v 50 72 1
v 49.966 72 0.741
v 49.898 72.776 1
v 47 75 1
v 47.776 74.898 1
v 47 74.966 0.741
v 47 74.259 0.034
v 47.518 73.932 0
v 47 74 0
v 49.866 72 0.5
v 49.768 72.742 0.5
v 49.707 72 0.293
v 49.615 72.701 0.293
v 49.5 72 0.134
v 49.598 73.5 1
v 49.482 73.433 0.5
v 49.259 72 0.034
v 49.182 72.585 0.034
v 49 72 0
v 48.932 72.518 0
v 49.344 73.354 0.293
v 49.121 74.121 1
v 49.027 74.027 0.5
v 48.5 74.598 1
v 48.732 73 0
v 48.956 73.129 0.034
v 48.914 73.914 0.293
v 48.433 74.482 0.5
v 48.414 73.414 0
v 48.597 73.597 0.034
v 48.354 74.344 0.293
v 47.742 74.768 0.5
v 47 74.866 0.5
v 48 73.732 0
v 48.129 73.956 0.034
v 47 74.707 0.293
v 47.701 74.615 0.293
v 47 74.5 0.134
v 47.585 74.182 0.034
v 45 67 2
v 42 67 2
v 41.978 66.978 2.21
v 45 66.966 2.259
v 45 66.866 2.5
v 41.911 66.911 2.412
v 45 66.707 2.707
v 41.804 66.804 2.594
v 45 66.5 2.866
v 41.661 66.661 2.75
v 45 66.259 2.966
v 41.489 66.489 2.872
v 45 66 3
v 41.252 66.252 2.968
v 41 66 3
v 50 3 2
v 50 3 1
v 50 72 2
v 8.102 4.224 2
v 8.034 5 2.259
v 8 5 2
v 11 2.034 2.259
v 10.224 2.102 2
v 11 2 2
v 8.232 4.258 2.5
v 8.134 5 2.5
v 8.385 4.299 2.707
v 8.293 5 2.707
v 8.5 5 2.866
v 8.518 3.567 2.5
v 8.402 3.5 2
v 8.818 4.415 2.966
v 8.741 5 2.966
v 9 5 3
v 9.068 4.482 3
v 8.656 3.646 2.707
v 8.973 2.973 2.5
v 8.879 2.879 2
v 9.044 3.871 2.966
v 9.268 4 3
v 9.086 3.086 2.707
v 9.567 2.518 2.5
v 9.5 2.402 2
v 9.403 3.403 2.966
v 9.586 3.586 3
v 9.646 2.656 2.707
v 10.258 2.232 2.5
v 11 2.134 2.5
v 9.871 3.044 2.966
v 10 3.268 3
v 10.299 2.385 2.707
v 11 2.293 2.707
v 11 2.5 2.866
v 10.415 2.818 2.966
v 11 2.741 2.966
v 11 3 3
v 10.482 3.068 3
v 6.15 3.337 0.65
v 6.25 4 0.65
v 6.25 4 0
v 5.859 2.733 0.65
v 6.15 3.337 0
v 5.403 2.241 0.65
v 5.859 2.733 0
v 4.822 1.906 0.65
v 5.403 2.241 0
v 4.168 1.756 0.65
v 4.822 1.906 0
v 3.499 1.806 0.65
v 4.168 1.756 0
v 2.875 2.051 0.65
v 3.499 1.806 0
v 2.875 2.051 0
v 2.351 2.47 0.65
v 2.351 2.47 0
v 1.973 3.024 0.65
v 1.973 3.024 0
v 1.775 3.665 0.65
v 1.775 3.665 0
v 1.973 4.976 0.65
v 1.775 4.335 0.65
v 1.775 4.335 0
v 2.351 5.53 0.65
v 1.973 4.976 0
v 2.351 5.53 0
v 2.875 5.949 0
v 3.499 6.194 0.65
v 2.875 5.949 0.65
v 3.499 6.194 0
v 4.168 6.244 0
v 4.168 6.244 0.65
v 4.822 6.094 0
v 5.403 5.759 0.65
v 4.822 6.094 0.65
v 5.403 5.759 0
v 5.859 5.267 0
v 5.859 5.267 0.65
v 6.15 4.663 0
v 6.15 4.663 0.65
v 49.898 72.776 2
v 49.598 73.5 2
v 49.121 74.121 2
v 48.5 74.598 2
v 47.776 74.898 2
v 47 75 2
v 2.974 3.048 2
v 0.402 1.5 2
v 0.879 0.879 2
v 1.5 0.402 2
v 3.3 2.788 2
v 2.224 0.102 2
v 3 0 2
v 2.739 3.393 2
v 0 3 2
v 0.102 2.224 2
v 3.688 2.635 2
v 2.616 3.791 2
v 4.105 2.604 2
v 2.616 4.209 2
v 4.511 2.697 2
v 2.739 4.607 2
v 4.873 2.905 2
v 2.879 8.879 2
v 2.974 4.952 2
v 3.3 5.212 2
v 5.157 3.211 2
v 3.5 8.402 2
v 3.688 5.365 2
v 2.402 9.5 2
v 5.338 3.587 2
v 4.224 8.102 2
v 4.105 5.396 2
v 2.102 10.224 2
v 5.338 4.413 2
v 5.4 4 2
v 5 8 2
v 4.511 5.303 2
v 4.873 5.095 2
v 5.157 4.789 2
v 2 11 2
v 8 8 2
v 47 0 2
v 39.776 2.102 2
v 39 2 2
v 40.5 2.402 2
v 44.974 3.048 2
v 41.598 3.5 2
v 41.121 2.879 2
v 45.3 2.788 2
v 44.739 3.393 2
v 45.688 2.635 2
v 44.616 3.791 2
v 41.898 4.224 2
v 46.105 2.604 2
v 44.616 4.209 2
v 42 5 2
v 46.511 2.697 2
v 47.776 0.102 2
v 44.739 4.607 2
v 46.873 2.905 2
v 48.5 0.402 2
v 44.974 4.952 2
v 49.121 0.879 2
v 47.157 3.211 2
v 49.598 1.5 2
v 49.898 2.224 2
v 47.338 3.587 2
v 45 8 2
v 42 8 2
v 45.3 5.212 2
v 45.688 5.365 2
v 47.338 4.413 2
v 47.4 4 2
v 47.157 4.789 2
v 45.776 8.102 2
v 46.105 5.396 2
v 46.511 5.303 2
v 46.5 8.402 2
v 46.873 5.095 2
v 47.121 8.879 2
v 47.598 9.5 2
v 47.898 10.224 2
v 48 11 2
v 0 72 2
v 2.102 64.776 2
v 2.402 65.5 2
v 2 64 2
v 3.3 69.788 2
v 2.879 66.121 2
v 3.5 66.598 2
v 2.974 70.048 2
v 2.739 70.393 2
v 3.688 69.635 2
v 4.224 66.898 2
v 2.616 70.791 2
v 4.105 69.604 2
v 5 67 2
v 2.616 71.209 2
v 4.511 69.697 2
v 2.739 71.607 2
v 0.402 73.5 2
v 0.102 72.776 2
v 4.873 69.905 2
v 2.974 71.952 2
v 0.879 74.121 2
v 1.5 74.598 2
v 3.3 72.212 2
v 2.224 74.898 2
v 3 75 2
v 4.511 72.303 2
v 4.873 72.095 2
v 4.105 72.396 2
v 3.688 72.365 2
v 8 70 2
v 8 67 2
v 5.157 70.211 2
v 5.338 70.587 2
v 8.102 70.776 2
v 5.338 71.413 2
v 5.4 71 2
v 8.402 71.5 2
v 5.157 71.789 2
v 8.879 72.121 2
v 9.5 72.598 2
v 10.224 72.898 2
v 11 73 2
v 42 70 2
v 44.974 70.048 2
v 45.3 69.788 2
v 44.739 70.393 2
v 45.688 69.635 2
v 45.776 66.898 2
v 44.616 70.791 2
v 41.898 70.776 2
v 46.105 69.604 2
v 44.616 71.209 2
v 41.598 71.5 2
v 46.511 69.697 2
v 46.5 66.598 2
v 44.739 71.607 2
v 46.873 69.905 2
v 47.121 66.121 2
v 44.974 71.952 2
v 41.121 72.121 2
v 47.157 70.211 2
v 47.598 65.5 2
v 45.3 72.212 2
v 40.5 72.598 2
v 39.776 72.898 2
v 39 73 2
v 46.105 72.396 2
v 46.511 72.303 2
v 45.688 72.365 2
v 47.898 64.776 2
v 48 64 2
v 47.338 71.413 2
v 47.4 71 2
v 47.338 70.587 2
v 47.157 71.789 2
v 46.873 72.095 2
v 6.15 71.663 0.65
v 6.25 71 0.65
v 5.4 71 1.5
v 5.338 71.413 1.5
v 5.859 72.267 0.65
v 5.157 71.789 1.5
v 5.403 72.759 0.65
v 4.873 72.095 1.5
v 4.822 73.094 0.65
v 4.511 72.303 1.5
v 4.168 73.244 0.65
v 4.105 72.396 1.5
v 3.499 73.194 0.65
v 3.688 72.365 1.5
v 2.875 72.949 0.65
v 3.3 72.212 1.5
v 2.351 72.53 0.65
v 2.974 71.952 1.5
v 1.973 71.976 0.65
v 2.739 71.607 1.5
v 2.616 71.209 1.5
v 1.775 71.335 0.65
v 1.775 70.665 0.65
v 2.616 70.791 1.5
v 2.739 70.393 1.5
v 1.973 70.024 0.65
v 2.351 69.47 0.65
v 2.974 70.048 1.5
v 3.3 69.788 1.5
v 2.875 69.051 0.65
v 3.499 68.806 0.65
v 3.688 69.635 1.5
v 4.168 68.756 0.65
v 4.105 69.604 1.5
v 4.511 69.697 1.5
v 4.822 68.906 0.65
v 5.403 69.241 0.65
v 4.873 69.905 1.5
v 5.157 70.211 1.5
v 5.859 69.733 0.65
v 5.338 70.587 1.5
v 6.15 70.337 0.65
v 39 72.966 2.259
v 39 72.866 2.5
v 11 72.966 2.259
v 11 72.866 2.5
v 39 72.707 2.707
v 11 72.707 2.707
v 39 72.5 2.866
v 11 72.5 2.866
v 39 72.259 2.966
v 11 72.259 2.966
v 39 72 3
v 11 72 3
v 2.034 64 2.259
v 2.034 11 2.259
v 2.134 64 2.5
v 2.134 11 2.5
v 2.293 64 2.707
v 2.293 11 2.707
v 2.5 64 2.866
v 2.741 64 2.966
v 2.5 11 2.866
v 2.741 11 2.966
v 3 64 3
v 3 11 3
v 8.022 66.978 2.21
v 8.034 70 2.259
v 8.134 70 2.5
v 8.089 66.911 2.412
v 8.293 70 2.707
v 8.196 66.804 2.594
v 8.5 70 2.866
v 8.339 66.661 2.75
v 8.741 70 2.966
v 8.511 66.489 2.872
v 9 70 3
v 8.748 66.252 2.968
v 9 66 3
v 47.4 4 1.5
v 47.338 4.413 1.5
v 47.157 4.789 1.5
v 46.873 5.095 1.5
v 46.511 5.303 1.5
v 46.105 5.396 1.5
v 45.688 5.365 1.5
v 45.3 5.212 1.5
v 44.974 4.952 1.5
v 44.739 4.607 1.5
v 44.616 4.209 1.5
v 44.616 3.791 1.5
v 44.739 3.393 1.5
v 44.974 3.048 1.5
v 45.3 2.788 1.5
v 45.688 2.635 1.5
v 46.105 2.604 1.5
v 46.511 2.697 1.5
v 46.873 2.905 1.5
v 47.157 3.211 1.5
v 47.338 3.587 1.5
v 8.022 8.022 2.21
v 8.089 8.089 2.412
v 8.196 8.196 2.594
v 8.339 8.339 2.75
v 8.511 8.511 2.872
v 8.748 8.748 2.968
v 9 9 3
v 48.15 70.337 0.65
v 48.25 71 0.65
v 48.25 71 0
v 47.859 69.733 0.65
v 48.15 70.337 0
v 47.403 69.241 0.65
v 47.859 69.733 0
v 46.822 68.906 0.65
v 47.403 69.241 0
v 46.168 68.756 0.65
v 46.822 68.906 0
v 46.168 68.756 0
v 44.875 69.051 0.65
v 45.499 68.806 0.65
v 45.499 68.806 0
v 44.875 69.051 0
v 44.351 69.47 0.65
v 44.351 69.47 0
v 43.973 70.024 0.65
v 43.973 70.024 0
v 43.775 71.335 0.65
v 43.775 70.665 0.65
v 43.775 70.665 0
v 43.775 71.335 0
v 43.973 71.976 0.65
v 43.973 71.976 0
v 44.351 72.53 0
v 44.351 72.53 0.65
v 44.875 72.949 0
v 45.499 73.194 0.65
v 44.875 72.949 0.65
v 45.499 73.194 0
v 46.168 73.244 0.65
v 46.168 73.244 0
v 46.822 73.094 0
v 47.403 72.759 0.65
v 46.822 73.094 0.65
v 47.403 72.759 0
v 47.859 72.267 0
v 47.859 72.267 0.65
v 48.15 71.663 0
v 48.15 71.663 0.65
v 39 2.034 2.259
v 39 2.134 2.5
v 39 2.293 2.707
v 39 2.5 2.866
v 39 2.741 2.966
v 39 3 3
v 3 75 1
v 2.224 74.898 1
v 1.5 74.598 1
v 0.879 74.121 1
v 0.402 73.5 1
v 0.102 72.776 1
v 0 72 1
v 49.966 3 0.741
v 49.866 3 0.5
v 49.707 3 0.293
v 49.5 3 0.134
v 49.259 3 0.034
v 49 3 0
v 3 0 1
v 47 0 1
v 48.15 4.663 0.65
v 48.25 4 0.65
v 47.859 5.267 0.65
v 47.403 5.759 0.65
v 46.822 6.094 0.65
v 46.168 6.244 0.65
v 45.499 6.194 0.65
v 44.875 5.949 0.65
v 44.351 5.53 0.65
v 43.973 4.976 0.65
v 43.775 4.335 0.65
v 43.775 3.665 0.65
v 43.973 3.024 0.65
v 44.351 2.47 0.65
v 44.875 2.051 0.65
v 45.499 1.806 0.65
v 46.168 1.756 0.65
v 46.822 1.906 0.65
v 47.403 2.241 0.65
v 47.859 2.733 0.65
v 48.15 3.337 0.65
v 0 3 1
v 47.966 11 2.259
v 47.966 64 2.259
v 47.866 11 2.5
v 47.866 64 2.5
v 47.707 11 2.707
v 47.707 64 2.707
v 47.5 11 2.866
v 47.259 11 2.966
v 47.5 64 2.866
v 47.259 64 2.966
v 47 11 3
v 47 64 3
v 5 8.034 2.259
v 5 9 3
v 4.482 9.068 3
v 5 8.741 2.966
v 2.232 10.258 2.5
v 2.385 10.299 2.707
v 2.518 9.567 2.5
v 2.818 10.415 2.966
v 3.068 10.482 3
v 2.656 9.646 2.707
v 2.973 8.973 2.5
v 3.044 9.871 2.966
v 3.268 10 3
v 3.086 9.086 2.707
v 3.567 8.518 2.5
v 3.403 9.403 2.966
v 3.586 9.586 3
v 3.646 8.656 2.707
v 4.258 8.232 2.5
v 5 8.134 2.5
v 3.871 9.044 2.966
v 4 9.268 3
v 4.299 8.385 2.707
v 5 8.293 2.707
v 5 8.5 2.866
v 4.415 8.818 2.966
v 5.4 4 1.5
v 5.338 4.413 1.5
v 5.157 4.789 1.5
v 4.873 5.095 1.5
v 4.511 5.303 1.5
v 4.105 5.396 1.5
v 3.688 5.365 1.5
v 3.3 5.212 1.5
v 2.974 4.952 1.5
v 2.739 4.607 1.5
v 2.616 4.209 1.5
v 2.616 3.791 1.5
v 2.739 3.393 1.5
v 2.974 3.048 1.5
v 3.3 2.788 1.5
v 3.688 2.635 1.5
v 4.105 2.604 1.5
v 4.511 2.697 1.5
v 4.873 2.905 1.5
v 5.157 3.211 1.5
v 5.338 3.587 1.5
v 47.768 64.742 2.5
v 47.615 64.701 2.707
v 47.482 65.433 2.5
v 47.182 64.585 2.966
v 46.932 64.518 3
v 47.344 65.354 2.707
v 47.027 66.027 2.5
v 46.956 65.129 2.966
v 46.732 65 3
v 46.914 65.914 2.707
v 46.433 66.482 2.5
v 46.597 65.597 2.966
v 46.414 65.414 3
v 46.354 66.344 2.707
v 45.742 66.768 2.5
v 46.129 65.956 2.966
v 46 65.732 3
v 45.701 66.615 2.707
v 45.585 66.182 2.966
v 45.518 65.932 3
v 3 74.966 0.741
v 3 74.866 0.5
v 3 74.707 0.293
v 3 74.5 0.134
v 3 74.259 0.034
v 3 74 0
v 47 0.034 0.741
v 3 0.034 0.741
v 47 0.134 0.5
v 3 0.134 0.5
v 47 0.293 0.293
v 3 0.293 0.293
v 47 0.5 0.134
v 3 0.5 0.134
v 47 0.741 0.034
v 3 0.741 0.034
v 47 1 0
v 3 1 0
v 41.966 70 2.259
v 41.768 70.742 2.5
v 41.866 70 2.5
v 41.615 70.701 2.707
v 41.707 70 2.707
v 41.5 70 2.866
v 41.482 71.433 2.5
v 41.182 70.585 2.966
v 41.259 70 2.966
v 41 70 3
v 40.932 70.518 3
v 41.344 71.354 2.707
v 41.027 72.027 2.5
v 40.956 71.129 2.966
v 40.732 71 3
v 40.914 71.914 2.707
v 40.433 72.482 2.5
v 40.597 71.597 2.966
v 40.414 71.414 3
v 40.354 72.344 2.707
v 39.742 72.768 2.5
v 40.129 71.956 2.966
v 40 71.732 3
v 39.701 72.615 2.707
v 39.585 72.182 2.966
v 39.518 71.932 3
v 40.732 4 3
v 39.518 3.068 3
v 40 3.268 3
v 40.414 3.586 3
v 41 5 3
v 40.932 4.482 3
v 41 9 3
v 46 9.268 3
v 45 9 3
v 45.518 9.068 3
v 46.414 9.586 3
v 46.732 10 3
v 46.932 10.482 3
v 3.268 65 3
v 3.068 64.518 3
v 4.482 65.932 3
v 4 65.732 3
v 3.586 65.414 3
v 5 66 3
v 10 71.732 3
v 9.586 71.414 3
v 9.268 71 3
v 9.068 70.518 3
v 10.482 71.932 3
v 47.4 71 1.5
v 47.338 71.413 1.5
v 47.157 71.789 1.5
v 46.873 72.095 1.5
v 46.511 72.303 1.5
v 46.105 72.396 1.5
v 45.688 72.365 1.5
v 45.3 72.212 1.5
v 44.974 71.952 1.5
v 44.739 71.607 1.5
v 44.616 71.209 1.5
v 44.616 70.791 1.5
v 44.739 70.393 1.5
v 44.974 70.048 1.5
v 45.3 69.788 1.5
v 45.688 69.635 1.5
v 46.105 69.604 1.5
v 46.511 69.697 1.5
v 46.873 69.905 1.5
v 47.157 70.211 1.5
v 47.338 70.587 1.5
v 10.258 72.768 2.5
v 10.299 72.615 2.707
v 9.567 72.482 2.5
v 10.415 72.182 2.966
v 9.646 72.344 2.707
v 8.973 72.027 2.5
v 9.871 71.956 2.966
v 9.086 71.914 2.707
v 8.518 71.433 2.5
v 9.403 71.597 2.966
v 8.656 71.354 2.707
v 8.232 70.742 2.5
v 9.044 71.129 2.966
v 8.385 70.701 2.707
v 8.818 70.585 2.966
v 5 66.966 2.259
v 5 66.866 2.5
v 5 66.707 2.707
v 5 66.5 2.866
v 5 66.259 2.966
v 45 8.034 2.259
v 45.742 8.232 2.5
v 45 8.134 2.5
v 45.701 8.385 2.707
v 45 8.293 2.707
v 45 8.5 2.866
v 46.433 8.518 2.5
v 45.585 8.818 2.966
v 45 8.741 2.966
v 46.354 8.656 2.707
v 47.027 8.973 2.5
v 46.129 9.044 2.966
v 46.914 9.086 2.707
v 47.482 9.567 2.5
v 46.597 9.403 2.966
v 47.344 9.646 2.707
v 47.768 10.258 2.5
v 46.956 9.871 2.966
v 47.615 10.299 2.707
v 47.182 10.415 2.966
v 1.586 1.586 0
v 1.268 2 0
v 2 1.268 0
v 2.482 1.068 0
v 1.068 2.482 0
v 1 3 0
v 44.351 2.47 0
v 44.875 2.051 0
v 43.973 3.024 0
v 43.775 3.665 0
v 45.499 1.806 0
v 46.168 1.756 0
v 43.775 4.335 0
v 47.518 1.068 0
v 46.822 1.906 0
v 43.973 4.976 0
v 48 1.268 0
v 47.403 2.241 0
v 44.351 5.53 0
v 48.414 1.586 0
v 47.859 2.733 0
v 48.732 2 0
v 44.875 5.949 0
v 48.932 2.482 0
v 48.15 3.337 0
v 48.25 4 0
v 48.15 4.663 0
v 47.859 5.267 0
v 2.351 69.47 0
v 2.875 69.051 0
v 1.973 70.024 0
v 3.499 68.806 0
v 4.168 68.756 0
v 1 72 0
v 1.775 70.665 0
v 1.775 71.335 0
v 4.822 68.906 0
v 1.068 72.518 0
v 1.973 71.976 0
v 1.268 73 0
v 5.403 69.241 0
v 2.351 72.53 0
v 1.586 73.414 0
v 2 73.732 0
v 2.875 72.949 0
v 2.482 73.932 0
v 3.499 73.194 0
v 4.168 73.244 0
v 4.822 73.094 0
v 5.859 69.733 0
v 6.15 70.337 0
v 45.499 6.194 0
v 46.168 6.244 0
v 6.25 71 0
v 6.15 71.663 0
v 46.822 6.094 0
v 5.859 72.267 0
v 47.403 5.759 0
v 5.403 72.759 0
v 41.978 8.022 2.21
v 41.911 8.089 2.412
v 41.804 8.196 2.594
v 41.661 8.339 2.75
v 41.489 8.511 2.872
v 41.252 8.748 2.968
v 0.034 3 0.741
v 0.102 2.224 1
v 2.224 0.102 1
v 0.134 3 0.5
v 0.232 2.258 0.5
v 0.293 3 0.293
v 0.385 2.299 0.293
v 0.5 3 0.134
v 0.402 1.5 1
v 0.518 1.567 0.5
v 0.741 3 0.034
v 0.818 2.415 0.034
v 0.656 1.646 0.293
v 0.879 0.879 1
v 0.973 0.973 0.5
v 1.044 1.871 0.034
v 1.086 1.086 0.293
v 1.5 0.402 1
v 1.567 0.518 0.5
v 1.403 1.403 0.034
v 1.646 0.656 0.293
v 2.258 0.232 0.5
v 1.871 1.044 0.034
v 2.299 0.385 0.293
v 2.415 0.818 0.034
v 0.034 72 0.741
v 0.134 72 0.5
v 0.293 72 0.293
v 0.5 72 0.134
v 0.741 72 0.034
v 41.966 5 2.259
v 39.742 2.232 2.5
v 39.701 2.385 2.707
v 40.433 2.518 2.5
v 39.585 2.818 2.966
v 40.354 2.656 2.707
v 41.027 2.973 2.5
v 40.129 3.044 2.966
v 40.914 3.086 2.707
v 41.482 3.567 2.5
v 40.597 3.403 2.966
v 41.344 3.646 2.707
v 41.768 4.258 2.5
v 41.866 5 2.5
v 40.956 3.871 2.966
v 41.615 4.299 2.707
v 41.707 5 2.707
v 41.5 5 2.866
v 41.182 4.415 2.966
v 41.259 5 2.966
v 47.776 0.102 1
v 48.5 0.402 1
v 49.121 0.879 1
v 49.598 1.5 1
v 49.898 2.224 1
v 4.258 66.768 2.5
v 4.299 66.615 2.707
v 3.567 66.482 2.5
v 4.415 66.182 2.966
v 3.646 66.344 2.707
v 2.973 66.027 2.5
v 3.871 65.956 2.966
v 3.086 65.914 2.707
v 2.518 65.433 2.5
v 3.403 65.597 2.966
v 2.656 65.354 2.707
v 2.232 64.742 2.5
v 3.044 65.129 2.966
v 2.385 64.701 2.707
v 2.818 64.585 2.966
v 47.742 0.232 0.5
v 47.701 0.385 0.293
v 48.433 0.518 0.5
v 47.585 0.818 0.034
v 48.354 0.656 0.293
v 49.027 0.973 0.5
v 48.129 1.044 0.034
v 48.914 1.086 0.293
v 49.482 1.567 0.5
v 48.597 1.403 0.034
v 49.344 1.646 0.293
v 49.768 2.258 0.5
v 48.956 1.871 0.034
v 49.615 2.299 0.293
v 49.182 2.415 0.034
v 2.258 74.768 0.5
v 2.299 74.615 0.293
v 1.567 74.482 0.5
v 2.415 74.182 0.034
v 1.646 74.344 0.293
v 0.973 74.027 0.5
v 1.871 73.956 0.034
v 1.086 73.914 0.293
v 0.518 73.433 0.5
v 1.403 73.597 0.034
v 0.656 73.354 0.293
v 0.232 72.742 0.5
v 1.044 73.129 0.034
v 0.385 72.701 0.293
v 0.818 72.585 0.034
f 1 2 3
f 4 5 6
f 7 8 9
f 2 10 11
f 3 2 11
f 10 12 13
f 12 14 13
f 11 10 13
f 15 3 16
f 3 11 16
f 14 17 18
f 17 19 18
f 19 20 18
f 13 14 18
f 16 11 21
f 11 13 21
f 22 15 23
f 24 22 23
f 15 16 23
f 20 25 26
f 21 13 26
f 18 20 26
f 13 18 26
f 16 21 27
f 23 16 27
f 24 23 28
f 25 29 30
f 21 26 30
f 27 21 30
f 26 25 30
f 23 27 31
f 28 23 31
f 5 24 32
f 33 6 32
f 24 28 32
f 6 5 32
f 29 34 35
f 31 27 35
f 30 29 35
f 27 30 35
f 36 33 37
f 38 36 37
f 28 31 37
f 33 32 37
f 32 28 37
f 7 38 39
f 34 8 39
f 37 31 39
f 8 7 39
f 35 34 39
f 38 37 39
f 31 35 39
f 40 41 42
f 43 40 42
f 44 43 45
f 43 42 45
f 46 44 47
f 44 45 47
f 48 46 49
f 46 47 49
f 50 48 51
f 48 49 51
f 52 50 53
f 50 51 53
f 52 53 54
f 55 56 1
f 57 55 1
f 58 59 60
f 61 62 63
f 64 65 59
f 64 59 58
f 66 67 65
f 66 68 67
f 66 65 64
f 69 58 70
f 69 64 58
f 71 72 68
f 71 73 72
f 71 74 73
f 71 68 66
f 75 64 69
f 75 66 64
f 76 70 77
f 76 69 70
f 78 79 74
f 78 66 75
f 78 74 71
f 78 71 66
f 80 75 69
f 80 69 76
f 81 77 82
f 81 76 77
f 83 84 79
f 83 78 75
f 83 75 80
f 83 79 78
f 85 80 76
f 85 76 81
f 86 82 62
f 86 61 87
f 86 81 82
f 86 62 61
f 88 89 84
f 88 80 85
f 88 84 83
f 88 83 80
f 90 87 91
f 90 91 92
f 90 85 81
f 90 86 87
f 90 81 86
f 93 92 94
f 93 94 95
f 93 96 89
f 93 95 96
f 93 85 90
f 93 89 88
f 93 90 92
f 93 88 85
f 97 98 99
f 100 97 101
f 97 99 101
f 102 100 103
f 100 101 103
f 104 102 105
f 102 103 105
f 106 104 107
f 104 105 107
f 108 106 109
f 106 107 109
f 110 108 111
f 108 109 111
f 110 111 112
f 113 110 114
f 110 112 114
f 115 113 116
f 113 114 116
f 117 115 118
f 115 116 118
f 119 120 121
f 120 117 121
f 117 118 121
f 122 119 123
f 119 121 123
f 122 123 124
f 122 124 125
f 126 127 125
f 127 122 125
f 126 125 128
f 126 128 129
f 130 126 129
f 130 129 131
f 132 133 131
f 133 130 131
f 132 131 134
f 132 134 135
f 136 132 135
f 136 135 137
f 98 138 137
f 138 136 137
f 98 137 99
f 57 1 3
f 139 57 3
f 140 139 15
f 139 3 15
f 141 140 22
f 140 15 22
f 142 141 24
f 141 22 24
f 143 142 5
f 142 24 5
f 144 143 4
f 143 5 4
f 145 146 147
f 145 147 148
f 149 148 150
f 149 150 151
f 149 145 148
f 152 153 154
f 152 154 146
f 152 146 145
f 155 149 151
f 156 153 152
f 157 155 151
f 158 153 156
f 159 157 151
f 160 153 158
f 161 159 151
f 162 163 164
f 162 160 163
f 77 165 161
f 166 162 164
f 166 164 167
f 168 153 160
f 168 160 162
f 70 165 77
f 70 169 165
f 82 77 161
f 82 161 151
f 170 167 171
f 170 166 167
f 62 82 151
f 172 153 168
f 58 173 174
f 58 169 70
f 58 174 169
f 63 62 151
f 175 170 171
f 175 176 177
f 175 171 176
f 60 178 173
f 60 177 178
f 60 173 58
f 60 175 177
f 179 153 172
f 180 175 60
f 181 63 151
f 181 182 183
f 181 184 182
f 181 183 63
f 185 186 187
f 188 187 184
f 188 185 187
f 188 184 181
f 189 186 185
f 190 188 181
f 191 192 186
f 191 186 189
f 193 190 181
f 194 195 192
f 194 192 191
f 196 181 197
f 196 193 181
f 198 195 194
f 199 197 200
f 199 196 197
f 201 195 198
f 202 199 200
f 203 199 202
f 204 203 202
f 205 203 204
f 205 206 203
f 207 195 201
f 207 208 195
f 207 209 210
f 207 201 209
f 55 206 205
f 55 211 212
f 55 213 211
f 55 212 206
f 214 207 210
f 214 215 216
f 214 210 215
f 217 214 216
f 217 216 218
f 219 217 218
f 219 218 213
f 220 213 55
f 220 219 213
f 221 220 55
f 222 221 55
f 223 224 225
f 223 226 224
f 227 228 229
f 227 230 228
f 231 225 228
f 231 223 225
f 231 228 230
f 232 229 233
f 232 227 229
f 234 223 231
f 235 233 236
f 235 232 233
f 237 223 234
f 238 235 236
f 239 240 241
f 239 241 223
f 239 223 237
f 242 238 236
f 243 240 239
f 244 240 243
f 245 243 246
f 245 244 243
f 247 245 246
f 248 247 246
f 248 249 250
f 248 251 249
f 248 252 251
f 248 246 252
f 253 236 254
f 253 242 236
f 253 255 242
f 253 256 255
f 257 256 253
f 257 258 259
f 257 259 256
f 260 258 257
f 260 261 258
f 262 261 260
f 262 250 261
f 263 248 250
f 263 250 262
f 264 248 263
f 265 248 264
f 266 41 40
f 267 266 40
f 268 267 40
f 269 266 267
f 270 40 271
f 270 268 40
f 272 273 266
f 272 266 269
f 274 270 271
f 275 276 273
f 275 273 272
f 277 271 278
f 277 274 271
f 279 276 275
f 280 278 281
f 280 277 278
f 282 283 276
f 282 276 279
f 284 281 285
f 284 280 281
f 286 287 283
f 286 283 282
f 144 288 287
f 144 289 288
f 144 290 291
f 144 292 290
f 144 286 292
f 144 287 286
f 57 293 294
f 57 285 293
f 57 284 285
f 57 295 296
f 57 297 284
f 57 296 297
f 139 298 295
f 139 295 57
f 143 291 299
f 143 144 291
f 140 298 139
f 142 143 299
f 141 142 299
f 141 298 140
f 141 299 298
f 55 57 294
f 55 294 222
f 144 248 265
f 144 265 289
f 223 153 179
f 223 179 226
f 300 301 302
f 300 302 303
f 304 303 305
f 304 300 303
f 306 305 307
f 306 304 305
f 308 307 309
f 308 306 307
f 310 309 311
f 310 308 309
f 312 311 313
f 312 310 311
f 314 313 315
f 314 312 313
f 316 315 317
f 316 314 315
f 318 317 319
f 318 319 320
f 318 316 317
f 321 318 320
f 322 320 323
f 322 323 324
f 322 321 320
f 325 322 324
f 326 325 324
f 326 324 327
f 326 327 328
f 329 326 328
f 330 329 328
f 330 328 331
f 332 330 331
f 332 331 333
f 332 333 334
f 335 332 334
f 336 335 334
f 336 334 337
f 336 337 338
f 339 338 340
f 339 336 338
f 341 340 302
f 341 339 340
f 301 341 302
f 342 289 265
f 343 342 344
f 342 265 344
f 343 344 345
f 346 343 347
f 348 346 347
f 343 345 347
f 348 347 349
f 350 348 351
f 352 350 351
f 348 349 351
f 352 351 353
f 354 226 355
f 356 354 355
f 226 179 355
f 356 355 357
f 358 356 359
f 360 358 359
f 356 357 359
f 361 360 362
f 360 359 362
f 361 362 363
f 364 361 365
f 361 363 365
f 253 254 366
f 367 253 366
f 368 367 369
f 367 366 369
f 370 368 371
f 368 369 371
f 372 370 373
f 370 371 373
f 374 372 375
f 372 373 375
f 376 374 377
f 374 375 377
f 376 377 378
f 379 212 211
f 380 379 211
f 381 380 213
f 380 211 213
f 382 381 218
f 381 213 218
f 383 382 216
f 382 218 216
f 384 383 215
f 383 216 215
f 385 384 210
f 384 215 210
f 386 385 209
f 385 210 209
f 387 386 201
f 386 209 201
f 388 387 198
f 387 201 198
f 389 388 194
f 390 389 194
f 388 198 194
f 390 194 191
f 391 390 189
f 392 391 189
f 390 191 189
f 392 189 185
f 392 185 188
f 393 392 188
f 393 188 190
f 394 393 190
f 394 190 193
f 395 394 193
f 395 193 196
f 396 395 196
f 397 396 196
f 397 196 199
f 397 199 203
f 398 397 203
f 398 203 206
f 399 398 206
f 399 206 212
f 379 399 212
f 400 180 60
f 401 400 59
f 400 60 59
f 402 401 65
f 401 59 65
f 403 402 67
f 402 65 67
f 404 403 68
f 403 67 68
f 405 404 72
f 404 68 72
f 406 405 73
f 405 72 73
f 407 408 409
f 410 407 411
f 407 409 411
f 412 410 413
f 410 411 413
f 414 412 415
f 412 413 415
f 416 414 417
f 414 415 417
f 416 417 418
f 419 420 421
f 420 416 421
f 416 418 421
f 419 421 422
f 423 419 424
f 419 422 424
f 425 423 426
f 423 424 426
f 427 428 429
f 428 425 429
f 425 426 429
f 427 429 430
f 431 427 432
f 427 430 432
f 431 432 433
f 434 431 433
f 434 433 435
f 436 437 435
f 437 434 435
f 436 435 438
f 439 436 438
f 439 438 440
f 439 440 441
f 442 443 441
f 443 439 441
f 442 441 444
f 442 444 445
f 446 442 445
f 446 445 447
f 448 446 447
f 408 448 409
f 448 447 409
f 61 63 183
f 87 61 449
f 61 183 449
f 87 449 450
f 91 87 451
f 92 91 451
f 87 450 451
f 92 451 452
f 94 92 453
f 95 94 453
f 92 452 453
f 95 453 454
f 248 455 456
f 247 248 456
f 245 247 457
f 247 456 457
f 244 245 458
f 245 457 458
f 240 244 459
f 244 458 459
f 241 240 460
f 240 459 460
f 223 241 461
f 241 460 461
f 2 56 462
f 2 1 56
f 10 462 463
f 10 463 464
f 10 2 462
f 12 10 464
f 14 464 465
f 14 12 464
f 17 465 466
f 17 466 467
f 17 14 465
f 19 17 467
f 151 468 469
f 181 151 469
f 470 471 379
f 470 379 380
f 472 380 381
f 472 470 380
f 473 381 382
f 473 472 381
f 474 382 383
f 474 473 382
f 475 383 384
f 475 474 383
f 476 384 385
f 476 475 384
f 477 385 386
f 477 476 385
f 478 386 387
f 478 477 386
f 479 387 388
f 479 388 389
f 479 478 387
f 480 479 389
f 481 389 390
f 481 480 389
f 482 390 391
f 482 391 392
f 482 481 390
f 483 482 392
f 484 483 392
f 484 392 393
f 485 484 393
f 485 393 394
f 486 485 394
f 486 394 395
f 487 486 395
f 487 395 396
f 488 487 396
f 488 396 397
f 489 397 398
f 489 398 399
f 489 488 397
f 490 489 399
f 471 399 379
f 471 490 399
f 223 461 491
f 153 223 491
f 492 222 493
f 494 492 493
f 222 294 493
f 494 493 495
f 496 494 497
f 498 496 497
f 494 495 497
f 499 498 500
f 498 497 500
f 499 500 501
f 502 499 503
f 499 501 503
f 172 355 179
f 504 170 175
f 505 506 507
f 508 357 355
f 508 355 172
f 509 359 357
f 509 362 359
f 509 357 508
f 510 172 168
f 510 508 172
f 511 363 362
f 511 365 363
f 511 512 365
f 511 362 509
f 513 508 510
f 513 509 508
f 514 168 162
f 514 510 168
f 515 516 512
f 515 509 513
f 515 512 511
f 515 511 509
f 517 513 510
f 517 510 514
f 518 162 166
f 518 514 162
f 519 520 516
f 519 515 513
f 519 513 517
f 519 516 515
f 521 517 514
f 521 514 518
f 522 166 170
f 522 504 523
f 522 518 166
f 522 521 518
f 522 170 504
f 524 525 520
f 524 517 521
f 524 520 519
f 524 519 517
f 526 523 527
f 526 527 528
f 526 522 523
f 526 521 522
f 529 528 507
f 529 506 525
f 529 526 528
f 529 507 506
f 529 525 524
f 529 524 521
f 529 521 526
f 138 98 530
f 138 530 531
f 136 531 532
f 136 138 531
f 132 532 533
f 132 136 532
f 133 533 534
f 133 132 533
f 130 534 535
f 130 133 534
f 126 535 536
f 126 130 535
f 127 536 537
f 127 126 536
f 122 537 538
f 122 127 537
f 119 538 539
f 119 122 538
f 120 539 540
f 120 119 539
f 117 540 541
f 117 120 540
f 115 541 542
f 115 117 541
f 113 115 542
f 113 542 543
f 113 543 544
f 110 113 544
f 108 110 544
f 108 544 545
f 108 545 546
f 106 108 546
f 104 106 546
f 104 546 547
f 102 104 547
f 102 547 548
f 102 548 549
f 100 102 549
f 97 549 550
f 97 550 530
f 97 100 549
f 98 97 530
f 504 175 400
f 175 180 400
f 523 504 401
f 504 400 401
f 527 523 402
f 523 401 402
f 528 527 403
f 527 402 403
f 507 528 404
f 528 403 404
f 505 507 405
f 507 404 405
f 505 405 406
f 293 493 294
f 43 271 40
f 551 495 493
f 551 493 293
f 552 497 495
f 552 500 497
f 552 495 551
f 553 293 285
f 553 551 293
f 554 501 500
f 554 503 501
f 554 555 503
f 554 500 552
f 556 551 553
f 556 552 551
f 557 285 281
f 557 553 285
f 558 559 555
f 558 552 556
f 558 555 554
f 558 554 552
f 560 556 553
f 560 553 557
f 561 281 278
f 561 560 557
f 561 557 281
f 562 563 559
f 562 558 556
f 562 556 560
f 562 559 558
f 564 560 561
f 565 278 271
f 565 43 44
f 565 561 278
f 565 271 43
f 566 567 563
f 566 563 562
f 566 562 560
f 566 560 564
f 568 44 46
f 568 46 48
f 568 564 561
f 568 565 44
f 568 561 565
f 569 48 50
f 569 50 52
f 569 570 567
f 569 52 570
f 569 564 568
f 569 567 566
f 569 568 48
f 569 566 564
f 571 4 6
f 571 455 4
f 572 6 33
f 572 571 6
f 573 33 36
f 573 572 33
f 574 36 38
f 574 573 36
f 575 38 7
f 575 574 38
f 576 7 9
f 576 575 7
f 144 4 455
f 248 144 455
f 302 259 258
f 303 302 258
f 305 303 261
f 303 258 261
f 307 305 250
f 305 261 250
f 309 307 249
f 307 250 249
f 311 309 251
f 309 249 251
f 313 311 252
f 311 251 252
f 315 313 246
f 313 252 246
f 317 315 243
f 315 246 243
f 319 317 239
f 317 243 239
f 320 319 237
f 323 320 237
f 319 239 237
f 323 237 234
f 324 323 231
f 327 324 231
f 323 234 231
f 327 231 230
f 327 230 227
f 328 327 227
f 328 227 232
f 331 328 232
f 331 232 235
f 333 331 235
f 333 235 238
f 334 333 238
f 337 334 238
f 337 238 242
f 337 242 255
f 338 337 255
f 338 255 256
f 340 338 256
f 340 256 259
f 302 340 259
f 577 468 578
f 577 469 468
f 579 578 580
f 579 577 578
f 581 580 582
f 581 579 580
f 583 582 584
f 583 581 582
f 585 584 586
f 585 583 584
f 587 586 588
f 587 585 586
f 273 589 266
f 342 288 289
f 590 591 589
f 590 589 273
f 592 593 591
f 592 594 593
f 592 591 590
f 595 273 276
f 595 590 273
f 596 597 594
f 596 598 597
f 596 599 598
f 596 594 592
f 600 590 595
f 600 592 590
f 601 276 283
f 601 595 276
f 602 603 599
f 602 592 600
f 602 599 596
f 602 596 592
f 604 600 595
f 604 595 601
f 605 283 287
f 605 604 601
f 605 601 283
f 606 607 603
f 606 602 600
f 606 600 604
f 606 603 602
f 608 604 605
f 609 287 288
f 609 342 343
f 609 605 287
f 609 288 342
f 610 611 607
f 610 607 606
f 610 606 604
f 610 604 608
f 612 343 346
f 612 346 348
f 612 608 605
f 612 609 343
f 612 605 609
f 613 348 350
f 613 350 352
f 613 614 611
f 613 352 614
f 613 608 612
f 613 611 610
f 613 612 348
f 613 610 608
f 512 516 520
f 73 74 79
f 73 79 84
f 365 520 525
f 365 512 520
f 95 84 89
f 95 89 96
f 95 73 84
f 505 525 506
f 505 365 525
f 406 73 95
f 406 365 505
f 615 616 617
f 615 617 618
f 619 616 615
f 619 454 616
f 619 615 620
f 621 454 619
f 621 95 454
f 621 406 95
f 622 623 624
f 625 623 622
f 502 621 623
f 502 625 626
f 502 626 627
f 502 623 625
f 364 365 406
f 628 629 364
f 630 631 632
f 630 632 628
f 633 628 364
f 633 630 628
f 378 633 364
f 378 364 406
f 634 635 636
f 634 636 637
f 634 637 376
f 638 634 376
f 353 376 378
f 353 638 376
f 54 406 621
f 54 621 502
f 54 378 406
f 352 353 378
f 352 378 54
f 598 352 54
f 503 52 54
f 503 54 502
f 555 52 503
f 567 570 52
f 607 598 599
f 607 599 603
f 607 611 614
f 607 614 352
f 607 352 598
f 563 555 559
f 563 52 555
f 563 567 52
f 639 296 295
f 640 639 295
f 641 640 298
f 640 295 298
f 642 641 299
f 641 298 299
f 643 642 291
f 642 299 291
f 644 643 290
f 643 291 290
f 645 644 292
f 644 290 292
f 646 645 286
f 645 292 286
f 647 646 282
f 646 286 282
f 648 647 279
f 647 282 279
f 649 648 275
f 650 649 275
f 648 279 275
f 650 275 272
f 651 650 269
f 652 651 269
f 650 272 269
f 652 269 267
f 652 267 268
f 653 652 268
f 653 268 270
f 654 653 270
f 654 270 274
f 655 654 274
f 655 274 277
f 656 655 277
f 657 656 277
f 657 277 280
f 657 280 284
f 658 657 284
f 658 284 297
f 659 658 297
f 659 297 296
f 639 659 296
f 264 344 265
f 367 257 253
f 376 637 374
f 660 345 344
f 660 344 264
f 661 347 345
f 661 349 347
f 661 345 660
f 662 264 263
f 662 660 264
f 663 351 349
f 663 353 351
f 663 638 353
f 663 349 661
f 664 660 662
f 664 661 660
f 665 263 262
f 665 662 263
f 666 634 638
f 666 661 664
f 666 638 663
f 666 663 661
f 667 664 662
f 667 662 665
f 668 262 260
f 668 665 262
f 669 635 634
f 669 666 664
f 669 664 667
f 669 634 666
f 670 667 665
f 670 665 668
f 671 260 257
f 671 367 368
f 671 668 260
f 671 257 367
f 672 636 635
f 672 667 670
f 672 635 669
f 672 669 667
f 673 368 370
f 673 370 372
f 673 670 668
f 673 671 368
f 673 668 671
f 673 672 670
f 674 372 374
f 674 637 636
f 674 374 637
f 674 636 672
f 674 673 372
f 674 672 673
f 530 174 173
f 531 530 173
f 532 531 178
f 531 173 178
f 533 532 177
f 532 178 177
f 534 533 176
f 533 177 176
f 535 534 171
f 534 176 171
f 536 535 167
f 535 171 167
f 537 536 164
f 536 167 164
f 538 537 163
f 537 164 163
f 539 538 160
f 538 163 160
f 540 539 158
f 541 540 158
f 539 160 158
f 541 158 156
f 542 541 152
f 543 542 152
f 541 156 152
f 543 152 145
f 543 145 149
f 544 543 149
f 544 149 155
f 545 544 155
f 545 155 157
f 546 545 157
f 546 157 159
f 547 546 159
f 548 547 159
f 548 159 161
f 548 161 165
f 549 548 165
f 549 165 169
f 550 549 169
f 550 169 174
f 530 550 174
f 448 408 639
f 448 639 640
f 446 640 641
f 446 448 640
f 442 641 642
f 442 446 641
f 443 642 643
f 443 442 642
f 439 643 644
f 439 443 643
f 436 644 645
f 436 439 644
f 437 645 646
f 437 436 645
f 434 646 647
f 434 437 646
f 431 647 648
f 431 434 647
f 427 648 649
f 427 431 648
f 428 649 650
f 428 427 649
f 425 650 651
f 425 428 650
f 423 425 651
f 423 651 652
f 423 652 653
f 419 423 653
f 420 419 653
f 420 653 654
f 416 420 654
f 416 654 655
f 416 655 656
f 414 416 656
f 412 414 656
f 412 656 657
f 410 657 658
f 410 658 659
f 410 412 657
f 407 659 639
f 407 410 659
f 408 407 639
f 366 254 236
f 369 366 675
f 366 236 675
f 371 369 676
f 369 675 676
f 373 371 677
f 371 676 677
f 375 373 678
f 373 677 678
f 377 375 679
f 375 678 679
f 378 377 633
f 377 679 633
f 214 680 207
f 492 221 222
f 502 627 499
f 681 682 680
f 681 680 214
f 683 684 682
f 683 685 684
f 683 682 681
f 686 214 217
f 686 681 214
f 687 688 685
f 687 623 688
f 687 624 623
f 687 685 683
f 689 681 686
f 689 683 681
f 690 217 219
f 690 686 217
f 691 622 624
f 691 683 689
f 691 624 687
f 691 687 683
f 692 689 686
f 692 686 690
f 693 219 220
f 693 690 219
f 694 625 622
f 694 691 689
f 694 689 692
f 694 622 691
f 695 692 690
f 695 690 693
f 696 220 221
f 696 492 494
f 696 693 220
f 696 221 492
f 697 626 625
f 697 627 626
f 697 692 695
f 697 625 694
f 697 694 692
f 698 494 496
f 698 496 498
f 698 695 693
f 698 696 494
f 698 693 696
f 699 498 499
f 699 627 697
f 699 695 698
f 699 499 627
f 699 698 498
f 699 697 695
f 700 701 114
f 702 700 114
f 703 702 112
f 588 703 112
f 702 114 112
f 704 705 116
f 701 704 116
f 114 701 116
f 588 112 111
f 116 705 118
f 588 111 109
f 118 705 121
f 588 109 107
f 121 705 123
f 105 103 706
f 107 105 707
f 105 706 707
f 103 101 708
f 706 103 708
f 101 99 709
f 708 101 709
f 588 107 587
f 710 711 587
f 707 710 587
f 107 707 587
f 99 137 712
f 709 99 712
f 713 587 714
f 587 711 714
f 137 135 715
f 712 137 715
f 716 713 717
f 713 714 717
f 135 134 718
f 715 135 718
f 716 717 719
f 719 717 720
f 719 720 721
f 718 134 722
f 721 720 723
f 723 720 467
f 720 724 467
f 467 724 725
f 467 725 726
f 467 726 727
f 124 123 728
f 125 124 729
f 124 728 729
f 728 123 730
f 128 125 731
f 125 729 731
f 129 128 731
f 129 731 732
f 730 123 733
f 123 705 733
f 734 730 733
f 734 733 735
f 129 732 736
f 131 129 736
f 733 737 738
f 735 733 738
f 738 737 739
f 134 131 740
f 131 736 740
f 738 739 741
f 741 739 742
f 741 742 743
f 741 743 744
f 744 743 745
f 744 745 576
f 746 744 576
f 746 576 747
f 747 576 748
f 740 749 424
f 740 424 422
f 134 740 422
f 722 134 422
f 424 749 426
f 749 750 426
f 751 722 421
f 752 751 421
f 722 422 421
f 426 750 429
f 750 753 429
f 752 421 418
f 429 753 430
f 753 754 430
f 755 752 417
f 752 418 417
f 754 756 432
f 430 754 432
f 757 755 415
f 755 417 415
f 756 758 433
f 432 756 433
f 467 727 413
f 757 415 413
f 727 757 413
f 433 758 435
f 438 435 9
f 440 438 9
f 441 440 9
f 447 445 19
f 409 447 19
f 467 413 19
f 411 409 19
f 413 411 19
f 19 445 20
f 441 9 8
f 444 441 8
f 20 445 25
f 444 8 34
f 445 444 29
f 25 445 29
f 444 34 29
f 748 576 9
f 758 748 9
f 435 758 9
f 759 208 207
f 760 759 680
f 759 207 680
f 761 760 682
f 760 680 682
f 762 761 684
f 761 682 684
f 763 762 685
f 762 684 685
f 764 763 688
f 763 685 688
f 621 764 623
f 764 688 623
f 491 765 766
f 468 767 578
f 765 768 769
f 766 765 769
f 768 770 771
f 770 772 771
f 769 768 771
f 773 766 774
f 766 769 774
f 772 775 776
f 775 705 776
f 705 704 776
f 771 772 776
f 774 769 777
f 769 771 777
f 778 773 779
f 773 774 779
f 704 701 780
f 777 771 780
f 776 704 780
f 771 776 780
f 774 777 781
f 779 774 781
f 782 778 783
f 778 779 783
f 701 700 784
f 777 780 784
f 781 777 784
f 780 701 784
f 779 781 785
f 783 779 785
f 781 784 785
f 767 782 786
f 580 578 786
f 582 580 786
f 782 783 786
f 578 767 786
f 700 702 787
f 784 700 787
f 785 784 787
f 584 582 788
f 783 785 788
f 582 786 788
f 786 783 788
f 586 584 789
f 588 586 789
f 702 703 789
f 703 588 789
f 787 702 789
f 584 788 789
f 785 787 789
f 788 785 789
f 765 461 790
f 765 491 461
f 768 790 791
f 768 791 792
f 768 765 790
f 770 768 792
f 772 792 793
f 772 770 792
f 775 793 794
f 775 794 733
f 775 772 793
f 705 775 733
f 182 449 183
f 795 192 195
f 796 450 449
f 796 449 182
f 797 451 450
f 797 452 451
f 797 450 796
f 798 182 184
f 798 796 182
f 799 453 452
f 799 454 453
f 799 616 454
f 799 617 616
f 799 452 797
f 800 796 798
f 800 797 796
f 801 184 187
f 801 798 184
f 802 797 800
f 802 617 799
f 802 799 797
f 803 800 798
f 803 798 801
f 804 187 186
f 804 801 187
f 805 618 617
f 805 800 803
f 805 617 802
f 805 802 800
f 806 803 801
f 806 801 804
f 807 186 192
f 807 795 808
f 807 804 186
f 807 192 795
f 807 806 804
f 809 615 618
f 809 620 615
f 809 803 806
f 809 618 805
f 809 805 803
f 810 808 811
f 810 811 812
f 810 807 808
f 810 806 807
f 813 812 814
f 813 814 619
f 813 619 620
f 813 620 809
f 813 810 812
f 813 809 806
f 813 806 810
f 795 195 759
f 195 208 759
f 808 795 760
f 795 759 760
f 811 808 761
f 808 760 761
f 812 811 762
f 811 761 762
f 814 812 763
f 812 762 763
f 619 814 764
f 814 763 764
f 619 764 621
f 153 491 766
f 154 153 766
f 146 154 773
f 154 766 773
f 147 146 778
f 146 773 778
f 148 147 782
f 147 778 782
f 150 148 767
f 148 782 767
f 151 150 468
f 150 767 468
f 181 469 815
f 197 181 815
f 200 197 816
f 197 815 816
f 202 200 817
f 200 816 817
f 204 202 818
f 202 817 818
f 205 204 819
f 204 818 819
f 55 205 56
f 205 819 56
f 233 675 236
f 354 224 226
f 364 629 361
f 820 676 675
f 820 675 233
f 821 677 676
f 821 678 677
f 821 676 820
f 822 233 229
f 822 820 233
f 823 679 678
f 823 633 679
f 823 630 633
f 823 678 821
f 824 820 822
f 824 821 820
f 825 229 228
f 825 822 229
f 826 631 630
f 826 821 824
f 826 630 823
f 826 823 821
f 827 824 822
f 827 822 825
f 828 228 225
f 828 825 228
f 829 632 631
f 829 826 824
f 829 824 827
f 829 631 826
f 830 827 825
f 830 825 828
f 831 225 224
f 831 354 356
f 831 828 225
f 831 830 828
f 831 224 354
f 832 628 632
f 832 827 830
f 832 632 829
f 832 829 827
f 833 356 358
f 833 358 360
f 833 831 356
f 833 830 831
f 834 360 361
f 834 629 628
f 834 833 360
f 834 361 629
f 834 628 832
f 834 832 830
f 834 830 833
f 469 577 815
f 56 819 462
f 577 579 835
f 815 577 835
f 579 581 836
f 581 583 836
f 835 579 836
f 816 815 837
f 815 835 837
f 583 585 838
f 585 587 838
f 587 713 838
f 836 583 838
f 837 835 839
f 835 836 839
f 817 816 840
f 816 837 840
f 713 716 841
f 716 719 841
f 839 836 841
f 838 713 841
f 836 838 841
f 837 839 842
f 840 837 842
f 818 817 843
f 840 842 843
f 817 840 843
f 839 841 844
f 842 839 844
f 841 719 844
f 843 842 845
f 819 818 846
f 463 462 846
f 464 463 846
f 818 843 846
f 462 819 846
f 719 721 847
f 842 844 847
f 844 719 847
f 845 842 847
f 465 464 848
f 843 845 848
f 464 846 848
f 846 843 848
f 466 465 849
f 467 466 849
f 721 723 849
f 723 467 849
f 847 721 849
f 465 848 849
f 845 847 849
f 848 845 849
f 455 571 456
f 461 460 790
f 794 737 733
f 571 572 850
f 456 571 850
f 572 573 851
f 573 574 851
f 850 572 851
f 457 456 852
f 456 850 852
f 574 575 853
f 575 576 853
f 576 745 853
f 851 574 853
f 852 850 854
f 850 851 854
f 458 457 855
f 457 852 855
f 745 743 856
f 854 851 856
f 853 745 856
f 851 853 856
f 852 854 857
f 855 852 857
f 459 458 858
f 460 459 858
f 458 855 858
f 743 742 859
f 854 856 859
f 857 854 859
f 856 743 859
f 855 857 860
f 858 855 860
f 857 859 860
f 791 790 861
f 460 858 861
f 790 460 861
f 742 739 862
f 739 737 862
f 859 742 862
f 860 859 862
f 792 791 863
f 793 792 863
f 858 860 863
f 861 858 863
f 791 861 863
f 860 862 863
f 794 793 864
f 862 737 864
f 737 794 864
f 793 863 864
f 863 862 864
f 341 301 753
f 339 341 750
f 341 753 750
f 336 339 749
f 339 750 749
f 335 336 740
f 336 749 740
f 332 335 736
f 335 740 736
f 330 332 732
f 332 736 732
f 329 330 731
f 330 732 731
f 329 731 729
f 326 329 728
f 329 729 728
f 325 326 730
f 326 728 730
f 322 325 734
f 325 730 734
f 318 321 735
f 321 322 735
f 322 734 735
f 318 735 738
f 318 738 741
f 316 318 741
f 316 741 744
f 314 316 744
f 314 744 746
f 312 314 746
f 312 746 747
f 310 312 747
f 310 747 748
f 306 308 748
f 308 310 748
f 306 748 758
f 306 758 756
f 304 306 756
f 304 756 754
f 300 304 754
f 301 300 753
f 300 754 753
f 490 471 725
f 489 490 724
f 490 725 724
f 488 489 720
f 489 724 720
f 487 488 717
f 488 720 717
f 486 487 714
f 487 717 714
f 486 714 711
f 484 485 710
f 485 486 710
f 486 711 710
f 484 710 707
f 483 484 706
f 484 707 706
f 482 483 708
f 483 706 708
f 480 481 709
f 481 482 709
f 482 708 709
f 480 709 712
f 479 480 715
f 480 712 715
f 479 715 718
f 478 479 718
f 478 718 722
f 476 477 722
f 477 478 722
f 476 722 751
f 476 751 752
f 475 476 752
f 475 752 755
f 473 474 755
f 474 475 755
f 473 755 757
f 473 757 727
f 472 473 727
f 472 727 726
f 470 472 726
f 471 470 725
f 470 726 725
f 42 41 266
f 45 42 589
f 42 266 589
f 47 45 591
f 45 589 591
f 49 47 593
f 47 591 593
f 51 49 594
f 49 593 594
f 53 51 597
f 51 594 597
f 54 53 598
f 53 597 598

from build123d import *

# Parameters (mm, degrees)
F1_DEPTH      = 2
F2_R          = 1.4
F3_DEPTH      = 5
F5_DEPTH      = 1
F6_R          = 0.99999
F7_R          = 1
F8_R          = 2.25
F9_DEPTH      = 0.5
F10_S5_R      = 2.25
F10_T6_DEPTH  = 5
F10_S11_R     = 2.25
F10_T12_DEPTH = 5
F10_S17_R     = 2.25
F10_T18_DEPTH = 5
F10_S23_R     = 2.25
F10_T24_DEPTH = 5


# Not quite as in the source:
# - a fillet or chamfer that OpenCascade refuses, or shapes differently, is made with other operations: its cross-section is extruded or revolved along the edge and cut away or added
# - a fillet or chamfer is up to 0.001 mm smaller than in the source, because OpenCascade refuses the exact size


with BuildPart() as f1:
    # F0 (on Top) → F1 (new body)
    with BuildSketch(Plane.XY):
        with BuildLine():
            ThreePointArc((0, 3), (0.8786796564, 0.8786796564), (3, 0))
            Line((3, 0), (47, 0))
            ThreePointArc((47, 0), (49.1213203436, 0.8786796564), (50, 3))
            Line((50, 3), (50, 72))
            ThreePointArc((50, 72), (49.1213203436, 74.1213203436), (47, 75))
            Line((47, 75), (3, 75))
            ThreePointArc((3, 75), (0.8786796564, 74.1213203436), (0, 72))
            Line((0, 72), (0, 3))
        make_face()
    extrude(amount=F1_DEPTH)

    # F2 (on face) → F3 (cut)
    with BuildSketch(Plane.XY.offset(2)):
        with Locations((4, 71)):
            Circle(F2_R)
        with Locations((46, 71)):
            Circle(F2_R)
        with Locations((4, 4)):
            Circle(F2_R)
        with Locations((46, 4)):
            Circle(F2_R)
    extrude(amount=-F3_DEPTH, mode=Mode.SUBTRACT)

    # F4 (on face) → F5 (join)
    with BuildSketch(Plane.XY.offset(2)):
        with BuildLine():
            ThreePointArc((8, 5), (8.8786796564, 2.8786796564), (11, 2))
            Line((11, 2), (39, 2))
            ThreePointArc((39, 2), (41.1213203436, 2.8786796564), (42, 5))
            Line((42, 5), (42, 8))
            Line((42, 8), (45, 8))
            ThreePointArc((45, 8), (47.1213203436, 8.8786796564), (48, 11))
            Line((48, 11), (48, 64))
            ThreePointArc((48, 64), (47.1213203436, 66.1213203436), (45, 67))
            Line((45, 67), (42, 67))
            Line((42, 67), (42, 70))
            ThreePointArc((42, 70), (41.1213203436, 72.1213203436), (39, 73))
            Line((39, 73), (11, 73))
            ThreePointArc((11, 73), (8.8786796564, 72.1213203436), (8, 70))
            Line((8, 70), (8, 67))
            Line((8, 67), (5, 67))
            ThreePointArc((5, 67), (2.8786796564, 66.1213203436), (2, 64))
            Line((2, 64), (2, 11))
            ThreePointArc((2, 11), (2.8786796564, 8.8786796564), (5, 8))
            Line((5, 8), (8, 8))
            Line((8, 8), (8, 5))
        make_face()
    extrude(amount=F5_DEPTH)

    # F6 (radius 1 in the source; OpenCascade refuses exactly that, so slightly less here)
    f6_edges = [f1.edges().sort_by_distance(p)[0] for p in [
        (47.12132, 8.87868, 3),
        (43.5, 8, 3),
        (42, 6.5, 3),
        (41.12132, 2.87868, 3),
        (25, 2, 3),
        (8.87868, 2.87868, 3),
        (8, 6.5, 3),
        (6.5, 8, 3),
        (2.87868, 8.87868, 3),
        (2, 37.5, 3),
        (2.87868, 66.12132, 3),
        (6.5, 67, 3),
        (8, 68.5, 3),
        (8.87868, 72.12132, 3),
        (25, 73, 3),
        (41.12132, 72.12132, 3),
        (42, 68.5, 3),
        (43.5, 67, 3),
        (47.12132, 66.12132, 3),
        (48, 37.5, 3),
    ]]
    fillet(f6_edges, radius=F6_R)

    # F7
    f7_edges = [f1.edges().sort_by_distance(p)[0] for p in [
        (0, 37.5, 0),
    ]]
    fillet(f7_edges, radius=F7_R)

    # F8 (on face) → F9 (cut)
    with BuildSketch(Plane(origin=(0, 0, 0), x_dir=(1, 0, 0), z_dir=(0, 0, -1))):
        with Locations((4, -4)):
            Circle(F8_R)
        with Locations((46, -4)):
            Circle(F8_R)
        with Locations((46, -71)):
            Circle(F8_R)
        with Locations((4, -71)):
            Circle(F8_R)
    extrude(amount=-F9_DEPTH, mode=Mode.SUBTRACT)

    # F10: chamfer of 1 on 4 edges, made by hand


with BuildPart() as f10_tool2:
    # F10_s3 → F10_t4 (revolve)
    with BuildSketch(Plane.XZ.offset(-4)):
        Polygon((5.4, 1.5), (6.4, 0.5), (5.4, 0.5), align=None)
    revolve(axis=Axis((4, 4, 0.5), (0, 0, 1)))

    # F10_s5 → F10_t6 (intersect, symmetric)
    with BuildSketch(Plane.XY.offset(1)):
        with Locations((4, 4)):
            Circle(F10_S5_R)
    extrude(amount=F10_T6_DEPTH, both=True, mode=Mode.INTERSECT)


with BuildPart() as f1_1:
    add(f1.part)

    # F10_t1: cut F10_tool2
    add(f10_tool2.part, mode=Mode.SUBTRACT)


with BuildPart() as f10_tool8:
    # F10_s9 → F10_t10 (revolve)
    with BuildSketch(Plane.XZ.offset(-4)):
        Polygon((47.4, 1.5), (48.4, 0.5), (47.4, 0.5), align=None)
    revolve(axis=Axis((46, 4, 0.5), (0, 0, 1)))

    # F10_s11 → F10_t12 (intersect, symmetric)
    with BuildSketch(Plane.XY.offset(1)):
        with Locations((46, 4)):
            Circle(F10_S11_R)
    extrude(amount=F10_T12_DEPTH, both=True, mode=Mode.INTERSECT)


with BuildPart() as f1_2:
    add(f1_1.part)

    # F10_t7: cut F10_tool8
    add(f10_tool8.part, mode=Mode.SUBTRACT)


with BuildPart() as f10_tool14:
    # F10_s15 → F10_t16 (revolve)
    with BuildSketch(Plane.XZ.offset(-71)):
        Polygon((5.4, 1.5), (6.4, 0.5), (5.4, 0.5), align=None)
    revolve(axis=Axis((4, 71, 0.5), (0, 0, 1)))

    # F10_s17 → F10_t18 (intersect, symmetric)
    with BuildSketch(Plane.XY.offset(1)):
        with Locations((4, 71)):
            Circle(F10_S17_R)
    extrude(amount=F10_T18_DEPTH, both=True, mode=Mode.INTERSECT)


with BuildPart() as f1_3:
    add(f1_2.part)

    # F10_t13: cut F10_tool14
    add(f10_tool14.part, mode=Mode.SUBTRACT)


with BuildPart() as f10_tool20:
    # F10_s21 → F10_t22 (revolve)
    with BuildSketch(Plane.XZ.offset(-71)):
        Polygon((47.4, 1.5), (48.4, 0.5), (47.4, 0.5), align=None)
    revolve(axis=Axis((46, 71, 0.5), (0, 0, 1)))

    # F10_s23 → F10_t24 (intersect, symmetric)
    with BuildSketch(Plane.XY.offset(1)):
        with Locations((46, 71)):
            Circle(F10_S23_R)
    extrude(amount=F10_T24_DEPTH, both=True, mode=Mode.INTERSECT)


with BuildPart() as f1_4:
    add(f1_3.part)

    # F10_t19: cut F10_tool20
    add(f10_tool20.part, mode=Mode.SUBTRACT)


solid = f1_4.part
